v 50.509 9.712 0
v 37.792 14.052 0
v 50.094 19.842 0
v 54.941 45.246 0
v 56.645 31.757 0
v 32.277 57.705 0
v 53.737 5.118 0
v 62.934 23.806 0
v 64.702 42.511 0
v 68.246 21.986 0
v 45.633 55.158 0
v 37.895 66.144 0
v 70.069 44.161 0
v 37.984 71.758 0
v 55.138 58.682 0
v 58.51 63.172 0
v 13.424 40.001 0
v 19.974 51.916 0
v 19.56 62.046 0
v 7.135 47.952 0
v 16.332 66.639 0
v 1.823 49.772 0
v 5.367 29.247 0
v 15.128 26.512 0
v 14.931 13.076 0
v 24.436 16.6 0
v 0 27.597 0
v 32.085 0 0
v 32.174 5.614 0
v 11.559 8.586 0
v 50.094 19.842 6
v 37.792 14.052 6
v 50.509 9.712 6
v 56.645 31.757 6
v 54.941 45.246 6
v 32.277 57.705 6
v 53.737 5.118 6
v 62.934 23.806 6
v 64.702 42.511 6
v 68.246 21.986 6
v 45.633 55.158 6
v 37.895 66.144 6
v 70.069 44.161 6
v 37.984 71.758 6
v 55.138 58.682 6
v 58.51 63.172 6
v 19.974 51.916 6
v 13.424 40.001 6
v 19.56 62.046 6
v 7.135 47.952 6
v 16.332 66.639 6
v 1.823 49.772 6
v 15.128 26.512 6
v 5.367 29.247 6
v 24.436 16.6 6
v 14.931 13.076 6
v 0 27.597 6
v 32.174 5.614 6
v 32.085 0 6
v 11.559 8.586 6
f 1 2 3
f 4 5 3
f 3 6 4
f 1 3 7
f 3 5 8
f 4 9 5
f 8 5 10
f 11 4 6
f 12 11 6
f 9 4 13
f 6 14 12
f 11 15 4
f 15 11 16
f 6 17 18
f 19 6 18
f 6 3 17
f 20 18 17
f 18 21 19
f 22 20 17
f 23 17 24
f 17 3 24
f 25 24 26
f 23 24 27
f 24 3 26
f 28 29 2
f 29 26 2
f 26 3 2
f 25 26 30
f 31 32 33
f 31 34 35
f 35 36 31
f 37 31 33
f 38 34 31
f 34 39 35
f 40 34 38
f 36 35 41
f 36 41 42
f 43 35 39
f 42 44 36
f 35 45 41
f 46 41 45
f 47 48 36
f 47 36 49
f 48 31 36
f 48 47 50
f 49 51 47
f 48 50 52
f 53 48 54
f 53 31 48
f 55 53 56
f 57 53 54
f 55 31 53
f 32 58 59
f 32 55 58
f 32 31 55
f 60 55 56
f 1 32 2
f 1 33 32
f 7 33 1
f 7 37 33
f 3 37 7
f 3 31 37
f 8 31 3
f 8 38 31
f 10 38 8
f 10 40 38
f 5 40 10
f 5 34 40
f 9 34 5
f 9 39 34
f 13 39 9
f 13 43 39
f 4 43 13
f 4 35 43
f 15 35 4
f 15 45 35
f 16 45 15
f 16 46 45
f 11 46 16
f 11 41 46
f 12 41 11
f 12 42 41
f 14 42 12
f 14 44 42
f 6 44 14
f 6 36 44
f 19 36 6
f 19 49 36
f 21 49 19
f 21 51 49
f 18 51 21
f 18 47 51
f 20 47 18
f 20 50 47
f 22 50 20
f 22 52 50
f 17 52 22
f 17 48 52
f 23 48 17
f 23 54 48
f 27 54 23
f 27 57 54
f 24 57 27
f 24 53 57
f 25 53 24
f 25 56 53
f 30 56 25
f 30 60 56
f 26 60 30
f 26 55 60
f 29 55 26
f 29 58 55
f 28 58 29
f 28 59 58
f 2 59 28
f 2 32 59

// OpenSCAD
$fn = 32;

// ----------------------------------------------------------------------
// Fan rotor section: 10 blades, 22 mm hub radius, 14 mm blades
// ----------------------------------------------------------------------

// --- parameters (mm) ---
profile_height = 6;       // extrusion height
profile_points = 30;      // points of the closed outline

profile = [[56.645, 31.757], [64.702, 42.511], [70.069, 44.161], [54.941, 45.246], [55.138, 58.682], [58.51, 63.172], [45.633, 55.158], [37.895, 66.144], [37.984, 71.758], [32.277, 57.705], [19.56, 62.046], [16.332, 66.639], [19.974, 51.916], [7.135, 47.952], [1.823, 49.772], [13.424, 40.001], [5.367, 29.247], [0, 27.597], [15.128, 26.512], [14.931, 13.076], [11.559, 8.586], [24.436, 16.6], [32.174, 5.614], [32.085, 0], [37.792, 14.052], [50.509, 9.712], [53.737, 5.118], [50.094, 19.842], [62.934, 23.806], [68.246, 21.986]];  // single closed polygon, 30 points, counter clockwise

// --- the one profile operation ---
linear_extrude(height = profile_height) polygon(points = profile);
